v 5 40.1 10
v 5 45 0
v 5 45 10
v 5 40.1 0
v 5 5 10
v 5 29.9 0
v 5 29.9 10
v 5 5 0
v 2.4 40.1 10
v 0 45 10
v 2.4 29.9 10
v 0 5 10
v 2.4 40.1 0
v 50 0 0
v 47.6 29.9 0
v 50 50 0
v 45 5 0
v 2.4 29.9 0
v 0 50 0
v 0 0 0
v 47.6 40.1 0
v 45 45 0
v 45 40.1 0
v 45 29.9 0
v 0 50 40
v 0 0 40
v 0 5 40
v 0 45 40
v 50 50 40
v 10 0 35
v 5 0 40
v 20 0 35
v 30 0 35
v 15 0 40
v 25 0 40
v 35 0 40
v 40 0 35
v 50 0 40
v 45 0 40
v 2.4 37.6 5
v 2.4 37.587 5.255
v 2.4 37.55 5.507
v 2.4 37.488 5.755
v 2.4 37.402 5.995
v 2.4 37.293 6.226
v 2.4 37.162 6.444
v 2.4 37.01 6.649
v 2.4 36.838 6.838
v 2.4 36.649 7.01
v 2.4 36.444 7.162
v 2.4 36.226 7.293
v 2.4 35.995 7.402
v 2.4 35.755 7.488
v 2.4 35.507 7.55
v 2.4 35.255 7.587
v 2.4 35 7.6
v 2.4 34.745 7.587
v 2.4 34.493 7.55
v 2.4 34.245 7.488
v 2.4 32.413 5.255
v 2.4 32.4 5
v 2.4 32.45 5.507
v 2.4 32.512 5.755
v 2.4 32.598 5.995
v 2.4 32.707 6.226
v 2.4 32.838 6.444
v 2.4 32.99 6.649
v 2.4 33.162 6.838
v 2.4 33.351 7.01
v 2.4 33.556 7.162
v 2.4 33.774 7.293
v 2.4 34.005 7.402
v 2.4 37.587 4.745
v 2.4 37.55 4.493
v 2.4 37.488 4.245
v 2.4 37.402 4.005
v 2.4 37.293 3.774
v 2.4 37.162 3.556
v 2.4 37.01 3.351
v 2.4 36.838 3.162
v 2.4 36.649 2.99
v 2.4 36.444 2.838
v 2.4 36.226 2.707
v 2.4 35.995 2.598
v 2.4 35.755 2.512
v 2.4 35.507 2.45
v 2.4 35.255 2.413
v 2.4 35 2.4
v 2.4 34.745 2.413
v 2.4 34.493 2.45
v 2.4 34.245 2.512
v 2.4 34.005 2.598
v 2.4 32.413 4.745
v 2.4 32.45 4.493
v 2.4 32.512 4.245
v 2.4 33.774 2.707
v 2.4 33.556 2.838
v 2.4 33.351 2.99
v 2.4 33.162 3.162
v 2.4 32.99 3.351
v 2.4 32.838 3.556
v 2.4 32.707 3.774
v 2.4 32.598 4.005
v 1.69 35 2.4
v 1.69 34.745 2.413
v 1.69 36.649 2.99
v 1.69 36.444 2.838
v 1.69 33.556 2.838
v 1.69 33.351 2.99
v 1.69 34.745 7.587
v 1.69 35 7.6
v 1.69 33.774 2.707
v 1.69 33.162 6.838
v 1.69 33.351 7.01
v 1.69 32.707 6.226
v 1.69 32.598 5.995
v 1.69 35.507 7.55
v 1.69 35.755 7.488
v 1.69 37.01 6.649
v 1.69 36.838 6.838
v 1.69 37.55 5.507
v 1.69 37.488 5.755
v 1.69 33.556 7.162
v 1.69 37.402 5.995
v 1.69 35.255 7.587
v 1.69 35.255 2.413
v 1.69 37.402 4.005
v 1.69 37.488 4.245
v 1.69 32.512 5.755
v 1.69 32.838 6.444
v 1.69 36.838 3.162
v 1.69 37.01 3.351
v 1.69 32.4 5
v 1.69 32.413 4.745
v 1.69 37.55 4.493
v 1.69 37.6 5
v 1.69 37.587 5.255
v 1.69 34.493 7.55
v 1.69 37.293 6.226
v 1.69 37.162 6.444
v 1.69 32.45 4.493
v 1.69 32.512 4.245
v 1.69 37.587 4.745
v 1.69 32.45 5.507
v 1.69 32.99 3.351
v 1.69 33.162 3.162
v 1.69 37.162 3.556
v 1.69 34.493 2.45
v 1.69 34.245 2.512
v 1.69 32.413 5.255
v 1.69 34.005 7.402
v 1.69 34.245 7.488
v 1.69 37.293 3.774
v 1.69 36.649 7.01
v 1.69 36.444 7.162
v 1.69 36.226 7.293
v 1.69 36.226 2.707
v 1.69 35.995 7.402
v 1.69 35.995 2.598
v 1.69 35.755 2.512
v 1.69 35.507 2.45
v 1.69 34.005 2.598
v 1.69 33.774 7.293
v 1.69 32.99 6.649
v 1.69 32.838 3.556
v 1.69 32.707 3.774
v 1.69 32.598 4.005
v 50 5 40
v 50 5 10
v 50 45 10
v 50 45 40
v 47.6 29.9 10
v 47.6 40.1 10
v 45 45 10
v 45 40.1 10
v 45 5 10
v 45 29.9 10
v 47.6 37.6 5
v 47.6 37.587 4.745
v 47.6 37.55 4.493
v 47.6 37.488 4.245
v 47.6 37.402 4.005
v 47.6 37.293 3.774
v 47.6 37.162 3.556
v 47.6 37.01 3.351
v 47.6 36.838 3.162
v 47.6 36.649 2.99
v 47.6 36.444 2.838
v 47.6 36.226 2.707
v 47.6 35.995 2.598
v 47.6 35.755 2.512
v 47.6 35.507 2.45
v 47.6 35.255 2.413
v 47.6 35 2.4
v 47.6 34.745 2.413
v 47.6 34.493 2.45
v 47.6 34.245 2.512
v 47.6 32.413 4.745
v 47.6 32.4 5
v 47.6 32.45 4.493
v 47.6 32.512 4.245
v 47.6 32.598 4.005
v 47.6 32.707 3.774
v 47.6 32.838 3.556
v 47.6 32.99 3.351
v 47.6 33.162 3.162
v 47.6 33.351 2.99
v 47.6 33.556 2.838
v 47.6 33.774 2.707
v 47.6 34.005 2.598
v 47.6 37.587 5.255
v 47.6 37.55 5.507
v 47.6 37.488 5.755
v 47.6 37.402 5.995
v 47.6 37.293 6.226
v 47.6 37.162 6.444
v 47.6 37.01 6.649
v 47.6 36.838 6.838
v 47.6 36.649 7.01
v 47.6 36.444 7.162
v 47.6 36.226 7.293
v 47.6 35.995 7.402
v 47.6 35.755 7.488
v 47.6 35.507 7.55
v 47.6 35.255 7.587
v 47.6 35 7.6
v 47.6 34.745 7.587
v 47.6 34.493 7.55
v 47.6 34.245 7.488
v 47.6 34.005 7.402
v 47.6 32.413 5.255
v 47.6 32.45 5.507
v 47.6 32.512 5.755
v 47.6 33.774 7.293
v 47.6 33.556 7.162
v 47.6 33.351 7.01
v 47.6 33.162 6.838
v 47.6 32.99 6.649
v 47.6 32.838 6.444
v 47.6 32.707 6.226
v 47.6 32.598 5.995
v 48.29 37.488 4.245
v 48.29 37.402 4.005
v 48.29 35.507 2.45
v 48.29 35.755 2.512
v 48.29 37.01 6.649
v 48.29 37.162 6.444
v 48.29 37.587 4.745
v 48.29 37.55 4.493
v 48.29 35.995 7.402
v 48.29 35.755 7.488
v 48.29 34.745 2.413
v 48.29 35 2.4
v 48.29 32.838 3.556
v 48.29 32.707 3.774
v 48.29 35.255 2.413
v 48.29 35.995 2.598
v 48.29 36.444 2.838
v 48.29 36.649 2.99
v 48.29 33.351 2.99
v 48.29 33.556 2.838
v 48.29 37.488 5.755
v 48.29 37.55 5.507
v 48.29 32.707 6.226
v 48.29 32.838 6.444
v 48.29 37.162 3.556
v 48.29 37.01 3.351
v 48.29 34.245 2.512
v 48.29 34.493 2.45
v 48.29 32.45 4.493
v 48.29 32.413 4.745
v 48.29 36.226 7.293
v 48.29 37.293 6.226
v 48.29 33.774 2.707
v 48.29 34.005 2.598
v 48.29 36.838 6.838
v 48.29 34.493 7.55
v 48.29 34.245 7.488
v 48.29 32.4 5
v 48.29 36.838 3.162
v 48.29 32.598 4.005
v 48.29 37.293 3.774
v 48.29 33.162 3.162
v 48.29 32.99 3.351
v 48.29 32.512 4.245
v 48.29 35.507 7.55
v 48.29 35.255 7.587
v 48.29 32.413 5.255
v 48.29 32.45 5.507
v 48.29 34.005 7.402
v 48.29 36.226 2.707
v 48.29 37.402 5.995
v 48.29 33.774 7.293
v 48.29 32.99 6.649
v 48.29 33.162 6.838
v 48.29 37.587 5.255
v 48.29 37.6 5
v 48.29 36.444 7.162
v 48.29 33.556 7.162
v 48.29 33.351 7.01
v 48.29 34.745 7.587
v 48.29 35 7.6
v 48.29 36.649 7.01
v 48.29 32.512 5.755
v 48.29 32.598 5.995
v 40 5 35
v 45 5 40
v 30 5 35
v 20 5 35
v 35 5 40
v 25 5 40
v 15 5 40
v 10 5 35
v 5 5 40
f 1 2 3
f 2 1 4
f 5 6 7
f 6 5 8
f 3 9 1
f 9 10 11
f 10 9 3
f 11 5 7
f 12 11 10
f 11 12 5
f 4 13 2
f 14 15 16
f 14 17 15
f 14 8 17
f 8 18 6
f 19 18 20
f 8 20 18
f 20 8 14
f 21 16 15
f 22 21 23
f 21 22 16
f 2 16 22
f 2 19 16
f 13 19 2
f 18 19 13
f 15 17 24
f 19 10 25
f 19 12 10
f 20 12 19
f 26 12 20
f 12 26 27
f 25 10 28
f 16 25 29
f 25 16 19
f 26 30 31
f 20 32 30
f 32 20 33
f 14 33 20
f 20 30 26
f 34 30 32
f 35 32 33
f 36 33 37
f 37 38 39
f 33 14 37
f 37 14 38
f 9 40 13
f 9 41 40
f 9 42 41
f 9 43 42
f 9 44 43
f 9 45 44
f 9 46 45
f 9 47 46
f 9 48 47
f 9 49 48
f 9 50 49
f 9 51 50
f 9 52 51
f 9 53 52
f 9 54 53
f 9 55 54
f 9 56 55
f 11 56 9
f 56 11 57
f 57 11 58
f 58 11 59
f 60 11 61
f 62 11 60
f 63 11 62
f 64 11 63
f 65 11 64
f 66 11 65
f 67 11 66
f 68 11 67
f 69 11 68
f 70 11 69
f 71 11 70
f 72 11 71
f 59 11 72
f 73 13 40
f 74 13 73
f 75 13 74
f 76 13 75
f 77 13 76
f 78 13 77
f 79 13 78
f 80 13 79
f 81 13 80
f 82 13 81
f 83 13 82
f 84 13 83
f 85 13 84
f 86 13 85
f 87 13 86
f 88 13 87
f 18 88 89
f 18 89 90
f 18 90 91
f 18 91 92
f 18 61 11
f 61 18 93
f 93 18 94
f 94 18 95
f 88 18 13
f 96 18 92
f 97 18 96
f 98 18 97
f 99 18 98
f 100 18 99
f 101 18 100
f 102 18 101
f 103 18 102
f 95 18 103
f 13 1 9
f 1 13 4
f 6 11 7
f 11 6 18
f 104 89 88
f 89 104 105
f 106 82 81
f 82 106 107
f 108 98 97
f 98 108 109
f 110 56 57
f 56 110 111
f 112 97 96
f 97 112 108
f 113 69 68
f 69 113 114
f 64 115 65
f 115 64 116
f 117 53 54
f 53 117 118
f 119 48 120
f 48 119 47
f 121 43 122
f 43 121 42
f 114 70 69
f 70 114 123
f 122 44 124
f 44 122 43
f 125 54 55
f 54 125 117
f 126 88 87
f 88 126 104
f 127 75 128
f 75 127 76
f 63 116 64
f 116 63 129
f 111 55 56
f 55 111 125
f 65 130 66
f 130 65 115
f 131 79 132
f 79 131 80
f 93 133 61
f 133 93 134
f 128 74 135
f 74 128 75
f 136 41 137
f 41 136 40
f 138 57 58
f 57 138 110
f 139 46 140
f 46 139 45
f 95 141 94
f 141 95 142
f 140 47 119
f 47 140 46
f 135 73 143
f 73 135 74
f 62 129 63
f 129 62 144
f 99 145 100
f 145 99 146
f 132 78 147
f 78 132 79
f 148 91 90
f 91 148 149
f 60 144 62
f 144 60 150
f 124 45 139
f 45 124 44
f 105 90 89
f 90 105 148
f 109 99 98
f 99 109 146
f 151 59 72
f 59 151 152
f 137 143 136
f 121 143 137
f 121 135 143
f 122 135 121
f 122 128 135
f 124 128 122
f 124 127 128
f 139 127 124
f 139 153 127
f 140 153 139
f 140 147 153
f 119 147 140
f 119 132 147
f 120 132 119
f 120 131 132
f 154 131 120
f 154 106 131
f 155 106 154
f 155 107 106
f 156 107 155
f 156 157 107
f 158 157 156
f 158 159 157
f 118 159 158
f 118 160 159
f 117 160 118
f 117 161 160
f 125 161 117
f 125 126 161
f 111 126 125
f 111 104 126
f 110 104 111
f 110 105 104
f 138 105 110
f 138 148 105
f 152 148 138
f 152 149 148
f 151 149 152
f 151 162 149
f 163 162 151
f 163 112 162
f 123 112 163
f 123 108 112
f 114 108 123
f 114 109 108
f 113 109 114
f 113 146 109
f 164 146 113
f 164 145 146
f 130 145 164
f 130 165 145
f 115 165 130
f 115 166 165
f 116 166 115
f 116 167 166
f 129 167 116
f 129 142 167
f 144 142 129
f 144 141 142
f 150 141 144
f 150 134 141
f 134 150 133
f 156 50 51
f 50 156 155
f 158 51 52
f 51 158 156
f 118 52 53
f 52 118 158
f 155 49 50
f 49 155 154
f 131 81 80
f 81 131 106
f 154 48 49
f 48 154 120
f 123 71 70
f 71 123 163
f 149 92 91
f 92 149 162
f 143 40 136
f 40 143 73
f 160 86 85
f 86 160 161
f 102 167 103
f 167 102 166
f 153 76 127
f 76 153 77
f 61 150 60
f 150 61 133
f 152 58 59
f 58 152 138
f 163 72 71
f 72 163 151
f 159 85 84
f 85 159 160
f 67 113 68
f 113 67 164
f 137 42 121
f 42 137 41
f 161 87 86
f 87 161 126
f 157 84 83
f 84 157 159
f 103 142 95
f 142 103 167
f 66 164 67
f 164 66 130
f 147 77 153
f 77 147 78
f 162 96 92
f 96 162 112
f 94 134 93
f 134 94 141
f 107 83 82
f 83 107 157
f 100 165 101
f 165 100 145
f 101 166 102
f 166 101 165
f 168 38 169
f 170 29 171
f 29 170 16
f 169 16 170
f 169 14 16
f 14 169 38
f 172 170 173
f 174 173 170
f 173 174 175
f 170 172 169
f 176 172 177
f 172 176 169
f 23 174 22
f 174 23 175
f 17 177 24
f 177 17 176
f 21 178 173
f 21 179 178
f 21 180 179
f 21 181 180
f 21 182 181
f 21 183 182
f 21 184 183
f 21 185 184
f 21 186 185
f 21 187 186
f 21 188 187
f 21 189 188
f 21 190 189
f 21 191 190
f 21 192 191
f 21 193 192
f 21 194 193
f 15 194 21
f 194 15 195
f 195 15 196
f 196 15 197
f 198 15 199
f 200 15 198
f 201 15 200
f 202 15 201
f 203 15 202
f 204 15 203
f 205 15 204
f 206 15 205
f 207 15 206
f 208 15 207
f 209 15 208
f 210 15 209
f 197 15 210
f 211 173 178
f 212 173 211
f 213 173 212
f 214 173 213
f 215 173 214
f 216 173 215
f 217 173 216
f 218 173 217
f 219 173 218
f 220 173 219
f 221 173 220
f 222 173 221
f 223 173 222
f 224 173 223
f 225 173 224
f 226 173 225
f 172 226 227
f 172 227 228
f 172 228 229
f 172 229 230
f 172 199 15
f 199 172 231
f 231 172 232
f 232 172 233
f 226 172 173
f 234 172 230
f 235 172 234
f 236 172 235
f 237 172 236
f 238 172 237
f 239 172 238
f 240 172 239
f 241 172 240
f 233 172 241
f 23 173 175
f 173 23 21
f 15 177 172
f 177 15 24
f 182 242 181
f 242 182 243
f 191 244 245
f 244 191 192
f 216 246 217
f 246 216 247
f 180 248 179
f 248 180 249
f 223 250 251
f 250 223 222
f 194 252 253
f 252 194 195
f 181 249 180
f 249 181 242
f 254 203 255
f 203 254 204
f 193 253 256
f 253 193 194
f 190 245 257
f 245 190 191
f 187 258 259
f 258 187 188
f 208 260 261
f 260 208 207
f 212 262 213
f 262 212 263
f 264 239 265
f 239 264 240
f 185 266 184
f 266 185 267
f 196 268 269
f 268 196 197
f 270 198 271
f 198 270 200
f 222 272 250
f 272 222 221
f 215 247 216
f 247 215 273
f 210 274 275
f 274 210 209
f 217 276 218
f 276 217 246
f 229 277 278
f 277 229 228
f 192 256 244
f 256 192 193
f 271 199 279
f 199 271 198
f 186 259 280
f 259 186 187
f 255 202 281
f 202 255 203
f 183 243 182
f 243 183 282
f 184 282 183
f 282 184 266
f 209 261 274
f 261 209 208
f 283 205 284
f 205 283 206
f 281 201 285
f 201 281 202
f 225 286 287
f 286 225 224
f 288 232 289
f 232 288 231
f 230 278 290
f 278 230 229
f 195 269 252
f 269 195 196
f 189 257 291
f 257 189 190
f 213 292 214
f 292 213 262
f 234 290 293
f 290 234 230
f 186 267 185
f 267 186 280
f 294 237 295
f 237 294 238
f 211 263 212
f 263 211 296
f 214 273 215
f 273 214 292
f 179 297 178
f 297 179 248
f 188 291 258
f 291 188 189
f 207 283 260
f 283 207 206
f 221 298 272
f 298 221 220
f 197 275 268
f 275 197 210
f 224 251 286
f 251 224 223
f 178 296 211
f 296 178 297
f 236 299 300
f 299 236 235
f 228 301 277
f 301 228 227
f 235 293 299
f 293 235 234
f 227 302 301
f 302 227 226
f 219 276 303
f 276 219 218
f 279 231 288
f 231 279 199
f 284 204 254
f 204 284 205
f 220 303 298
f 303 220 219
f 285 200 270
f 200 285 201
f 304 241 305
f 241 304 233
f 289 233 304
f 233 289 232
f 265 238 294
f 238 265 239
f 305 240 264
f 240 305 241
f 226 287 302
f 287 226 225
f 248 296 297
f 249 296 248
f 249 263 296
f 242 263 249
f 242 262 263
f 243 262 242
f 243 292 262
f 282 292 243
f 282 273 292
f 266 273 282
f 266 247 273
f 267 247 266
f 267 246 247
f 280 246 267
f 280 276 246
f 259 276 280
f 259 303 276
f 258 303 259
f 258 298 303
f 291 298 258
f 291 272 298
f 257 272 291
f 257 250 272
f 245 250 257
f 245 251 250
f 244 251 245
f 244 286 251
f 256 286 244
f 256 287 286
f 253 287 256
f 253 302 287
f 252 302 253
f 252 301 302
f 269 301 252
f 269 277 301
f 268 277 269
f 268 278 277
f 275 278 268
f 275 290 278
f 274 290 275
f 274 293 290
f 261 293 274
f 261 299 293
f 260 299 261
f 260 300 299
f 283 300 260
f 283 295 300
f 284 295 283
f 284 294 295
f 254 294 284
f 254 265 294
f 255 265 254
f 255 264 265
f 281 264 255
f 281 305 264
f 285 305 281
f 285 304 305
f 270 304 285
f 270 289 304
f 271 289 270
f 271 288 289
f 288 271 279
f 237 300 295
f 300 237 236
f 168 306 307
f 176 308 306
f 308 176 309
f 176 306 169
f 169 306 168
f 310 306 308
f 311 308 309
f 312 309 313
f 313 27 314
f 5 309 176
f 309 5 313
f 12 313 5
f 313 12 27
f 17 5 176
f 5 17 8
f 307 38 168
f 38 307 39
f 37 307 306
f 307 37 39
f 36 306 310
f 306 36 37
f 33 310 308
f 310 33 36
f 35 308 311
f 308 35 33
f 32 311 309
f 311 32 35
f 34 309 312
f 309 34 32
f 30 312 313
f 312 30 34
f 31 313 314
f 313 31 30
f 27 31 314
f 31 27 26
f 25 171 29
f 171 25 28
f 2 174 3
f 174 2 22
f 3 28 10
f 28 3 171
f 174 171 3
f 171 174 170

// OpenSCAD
n = 4; // number of chop sticks
s = 5; // defines the grid
wd = 5; // wall depth
d = 50; // depth of entire part
h = 40;
wh = 10; // wall height
play = 0.2;
eps = 0.01;
snap_h=0.6;

d2 = 30; // y location of part2 relative to part1

$fn = 64;

// calculated
w = n*2*s + 2*wd;

module part1() {
    module front() {
        translate([0, wd, 0])
        rotate([90, 0, 0])
        linear_extrude(height=wd) {
            polygon([
                [0, 0],
                [0, h],
                for( i= [ 0 : 1 : 2*n ] )
                    [i*s + wd, i % 2 == 0 ? h : h -s],
                [w, h],
                [w, 0]
            ]);
        };
    };

    module side_left() {
        difference() {
            cube([wd, d, wh]);
            
            translate([wd/2-play/2, d2-play/2, -eps]) {
                cube([wd/2+play/2+eps, wh+play, wh+2*eps]);
            }
            
            translate([wd/2-eps, d2+wh/2, wh/2 ])
            rotate([0, -90, 0])
            cylinder(r=wh/4+play/2, h=snap_h+play);            
        }
    }

    module side_right() {
        translate([w-wd, 0, 0])
        difference() {
            cube([wd, d, wh]);

            translate([-eps, d2-play/2, -eps]) {
                cube([wd/2+play/2+eps, wh+play, wh+2*eps]);
            }
            
            translate([wd/2-eps, d2+wh/2, wh/2 ])
            rotate([0, 90, 0])
            cylinder(r=wh/4+play/2, h=snap_h+play);
        }
    }

    module back() {
        translate([0, d-wd, 0])
        cube([w, wd, h]);
    }

    front();
    side_left();
    side_right();
    back();
}

module part2() {
    module main() {
        h2 = 25;

        translate([0, wd, 0])
        rotate([90, 0, 0])
        linear_extrude(height=wd) {
            polygon([
                [0, h2],
                [0, h],
                [w, h],
                [w, h2],
                for( i= [ 2*n : -1 : 0 ] )
                    [i*s + wd, i % 2 == 0 ? h2 : h2+s],
            ]);
        };
    }

    module side_left() {
        translate([ 0, wd/2-wh/2, 0]) {
            difference() {
                cube([wd, wh, h]);
                translate([-eps, -eps, -eps]) {
                    cube([wd/2+eps-play/2, wh+2*eps, wh+eps+play]);
                };
            }
            translate([wd/2-eps, wh/2, wh/2 ])
            rotate([0, -90, 0])
            cylinder(r=wh/4-play/2, h=snap_h-play/2+eps);
            
        }
    }

    module side_right() {
        translate([ w-wd, wd/2-wh/2, 0]) {
            difference() {
                cube([wd, wh, h]);
                translate([wd/2-play/2, -eps, -eps]) {
                    cube([wd/2+eps+play/2, wh+2*eps, wh+eps+play]);
               };
            }
            translate([wd/2-play/2-eps, wh/2, wh/2 ])
            rotate([0, 90, 0])
            cylinder(r=wh/4-play/2, h=snap_h+eps);
        }
    }

    main();
    side_left();
    side_right();
}

part1();

// translate([1.5*w, d2, 0])
// part2();
